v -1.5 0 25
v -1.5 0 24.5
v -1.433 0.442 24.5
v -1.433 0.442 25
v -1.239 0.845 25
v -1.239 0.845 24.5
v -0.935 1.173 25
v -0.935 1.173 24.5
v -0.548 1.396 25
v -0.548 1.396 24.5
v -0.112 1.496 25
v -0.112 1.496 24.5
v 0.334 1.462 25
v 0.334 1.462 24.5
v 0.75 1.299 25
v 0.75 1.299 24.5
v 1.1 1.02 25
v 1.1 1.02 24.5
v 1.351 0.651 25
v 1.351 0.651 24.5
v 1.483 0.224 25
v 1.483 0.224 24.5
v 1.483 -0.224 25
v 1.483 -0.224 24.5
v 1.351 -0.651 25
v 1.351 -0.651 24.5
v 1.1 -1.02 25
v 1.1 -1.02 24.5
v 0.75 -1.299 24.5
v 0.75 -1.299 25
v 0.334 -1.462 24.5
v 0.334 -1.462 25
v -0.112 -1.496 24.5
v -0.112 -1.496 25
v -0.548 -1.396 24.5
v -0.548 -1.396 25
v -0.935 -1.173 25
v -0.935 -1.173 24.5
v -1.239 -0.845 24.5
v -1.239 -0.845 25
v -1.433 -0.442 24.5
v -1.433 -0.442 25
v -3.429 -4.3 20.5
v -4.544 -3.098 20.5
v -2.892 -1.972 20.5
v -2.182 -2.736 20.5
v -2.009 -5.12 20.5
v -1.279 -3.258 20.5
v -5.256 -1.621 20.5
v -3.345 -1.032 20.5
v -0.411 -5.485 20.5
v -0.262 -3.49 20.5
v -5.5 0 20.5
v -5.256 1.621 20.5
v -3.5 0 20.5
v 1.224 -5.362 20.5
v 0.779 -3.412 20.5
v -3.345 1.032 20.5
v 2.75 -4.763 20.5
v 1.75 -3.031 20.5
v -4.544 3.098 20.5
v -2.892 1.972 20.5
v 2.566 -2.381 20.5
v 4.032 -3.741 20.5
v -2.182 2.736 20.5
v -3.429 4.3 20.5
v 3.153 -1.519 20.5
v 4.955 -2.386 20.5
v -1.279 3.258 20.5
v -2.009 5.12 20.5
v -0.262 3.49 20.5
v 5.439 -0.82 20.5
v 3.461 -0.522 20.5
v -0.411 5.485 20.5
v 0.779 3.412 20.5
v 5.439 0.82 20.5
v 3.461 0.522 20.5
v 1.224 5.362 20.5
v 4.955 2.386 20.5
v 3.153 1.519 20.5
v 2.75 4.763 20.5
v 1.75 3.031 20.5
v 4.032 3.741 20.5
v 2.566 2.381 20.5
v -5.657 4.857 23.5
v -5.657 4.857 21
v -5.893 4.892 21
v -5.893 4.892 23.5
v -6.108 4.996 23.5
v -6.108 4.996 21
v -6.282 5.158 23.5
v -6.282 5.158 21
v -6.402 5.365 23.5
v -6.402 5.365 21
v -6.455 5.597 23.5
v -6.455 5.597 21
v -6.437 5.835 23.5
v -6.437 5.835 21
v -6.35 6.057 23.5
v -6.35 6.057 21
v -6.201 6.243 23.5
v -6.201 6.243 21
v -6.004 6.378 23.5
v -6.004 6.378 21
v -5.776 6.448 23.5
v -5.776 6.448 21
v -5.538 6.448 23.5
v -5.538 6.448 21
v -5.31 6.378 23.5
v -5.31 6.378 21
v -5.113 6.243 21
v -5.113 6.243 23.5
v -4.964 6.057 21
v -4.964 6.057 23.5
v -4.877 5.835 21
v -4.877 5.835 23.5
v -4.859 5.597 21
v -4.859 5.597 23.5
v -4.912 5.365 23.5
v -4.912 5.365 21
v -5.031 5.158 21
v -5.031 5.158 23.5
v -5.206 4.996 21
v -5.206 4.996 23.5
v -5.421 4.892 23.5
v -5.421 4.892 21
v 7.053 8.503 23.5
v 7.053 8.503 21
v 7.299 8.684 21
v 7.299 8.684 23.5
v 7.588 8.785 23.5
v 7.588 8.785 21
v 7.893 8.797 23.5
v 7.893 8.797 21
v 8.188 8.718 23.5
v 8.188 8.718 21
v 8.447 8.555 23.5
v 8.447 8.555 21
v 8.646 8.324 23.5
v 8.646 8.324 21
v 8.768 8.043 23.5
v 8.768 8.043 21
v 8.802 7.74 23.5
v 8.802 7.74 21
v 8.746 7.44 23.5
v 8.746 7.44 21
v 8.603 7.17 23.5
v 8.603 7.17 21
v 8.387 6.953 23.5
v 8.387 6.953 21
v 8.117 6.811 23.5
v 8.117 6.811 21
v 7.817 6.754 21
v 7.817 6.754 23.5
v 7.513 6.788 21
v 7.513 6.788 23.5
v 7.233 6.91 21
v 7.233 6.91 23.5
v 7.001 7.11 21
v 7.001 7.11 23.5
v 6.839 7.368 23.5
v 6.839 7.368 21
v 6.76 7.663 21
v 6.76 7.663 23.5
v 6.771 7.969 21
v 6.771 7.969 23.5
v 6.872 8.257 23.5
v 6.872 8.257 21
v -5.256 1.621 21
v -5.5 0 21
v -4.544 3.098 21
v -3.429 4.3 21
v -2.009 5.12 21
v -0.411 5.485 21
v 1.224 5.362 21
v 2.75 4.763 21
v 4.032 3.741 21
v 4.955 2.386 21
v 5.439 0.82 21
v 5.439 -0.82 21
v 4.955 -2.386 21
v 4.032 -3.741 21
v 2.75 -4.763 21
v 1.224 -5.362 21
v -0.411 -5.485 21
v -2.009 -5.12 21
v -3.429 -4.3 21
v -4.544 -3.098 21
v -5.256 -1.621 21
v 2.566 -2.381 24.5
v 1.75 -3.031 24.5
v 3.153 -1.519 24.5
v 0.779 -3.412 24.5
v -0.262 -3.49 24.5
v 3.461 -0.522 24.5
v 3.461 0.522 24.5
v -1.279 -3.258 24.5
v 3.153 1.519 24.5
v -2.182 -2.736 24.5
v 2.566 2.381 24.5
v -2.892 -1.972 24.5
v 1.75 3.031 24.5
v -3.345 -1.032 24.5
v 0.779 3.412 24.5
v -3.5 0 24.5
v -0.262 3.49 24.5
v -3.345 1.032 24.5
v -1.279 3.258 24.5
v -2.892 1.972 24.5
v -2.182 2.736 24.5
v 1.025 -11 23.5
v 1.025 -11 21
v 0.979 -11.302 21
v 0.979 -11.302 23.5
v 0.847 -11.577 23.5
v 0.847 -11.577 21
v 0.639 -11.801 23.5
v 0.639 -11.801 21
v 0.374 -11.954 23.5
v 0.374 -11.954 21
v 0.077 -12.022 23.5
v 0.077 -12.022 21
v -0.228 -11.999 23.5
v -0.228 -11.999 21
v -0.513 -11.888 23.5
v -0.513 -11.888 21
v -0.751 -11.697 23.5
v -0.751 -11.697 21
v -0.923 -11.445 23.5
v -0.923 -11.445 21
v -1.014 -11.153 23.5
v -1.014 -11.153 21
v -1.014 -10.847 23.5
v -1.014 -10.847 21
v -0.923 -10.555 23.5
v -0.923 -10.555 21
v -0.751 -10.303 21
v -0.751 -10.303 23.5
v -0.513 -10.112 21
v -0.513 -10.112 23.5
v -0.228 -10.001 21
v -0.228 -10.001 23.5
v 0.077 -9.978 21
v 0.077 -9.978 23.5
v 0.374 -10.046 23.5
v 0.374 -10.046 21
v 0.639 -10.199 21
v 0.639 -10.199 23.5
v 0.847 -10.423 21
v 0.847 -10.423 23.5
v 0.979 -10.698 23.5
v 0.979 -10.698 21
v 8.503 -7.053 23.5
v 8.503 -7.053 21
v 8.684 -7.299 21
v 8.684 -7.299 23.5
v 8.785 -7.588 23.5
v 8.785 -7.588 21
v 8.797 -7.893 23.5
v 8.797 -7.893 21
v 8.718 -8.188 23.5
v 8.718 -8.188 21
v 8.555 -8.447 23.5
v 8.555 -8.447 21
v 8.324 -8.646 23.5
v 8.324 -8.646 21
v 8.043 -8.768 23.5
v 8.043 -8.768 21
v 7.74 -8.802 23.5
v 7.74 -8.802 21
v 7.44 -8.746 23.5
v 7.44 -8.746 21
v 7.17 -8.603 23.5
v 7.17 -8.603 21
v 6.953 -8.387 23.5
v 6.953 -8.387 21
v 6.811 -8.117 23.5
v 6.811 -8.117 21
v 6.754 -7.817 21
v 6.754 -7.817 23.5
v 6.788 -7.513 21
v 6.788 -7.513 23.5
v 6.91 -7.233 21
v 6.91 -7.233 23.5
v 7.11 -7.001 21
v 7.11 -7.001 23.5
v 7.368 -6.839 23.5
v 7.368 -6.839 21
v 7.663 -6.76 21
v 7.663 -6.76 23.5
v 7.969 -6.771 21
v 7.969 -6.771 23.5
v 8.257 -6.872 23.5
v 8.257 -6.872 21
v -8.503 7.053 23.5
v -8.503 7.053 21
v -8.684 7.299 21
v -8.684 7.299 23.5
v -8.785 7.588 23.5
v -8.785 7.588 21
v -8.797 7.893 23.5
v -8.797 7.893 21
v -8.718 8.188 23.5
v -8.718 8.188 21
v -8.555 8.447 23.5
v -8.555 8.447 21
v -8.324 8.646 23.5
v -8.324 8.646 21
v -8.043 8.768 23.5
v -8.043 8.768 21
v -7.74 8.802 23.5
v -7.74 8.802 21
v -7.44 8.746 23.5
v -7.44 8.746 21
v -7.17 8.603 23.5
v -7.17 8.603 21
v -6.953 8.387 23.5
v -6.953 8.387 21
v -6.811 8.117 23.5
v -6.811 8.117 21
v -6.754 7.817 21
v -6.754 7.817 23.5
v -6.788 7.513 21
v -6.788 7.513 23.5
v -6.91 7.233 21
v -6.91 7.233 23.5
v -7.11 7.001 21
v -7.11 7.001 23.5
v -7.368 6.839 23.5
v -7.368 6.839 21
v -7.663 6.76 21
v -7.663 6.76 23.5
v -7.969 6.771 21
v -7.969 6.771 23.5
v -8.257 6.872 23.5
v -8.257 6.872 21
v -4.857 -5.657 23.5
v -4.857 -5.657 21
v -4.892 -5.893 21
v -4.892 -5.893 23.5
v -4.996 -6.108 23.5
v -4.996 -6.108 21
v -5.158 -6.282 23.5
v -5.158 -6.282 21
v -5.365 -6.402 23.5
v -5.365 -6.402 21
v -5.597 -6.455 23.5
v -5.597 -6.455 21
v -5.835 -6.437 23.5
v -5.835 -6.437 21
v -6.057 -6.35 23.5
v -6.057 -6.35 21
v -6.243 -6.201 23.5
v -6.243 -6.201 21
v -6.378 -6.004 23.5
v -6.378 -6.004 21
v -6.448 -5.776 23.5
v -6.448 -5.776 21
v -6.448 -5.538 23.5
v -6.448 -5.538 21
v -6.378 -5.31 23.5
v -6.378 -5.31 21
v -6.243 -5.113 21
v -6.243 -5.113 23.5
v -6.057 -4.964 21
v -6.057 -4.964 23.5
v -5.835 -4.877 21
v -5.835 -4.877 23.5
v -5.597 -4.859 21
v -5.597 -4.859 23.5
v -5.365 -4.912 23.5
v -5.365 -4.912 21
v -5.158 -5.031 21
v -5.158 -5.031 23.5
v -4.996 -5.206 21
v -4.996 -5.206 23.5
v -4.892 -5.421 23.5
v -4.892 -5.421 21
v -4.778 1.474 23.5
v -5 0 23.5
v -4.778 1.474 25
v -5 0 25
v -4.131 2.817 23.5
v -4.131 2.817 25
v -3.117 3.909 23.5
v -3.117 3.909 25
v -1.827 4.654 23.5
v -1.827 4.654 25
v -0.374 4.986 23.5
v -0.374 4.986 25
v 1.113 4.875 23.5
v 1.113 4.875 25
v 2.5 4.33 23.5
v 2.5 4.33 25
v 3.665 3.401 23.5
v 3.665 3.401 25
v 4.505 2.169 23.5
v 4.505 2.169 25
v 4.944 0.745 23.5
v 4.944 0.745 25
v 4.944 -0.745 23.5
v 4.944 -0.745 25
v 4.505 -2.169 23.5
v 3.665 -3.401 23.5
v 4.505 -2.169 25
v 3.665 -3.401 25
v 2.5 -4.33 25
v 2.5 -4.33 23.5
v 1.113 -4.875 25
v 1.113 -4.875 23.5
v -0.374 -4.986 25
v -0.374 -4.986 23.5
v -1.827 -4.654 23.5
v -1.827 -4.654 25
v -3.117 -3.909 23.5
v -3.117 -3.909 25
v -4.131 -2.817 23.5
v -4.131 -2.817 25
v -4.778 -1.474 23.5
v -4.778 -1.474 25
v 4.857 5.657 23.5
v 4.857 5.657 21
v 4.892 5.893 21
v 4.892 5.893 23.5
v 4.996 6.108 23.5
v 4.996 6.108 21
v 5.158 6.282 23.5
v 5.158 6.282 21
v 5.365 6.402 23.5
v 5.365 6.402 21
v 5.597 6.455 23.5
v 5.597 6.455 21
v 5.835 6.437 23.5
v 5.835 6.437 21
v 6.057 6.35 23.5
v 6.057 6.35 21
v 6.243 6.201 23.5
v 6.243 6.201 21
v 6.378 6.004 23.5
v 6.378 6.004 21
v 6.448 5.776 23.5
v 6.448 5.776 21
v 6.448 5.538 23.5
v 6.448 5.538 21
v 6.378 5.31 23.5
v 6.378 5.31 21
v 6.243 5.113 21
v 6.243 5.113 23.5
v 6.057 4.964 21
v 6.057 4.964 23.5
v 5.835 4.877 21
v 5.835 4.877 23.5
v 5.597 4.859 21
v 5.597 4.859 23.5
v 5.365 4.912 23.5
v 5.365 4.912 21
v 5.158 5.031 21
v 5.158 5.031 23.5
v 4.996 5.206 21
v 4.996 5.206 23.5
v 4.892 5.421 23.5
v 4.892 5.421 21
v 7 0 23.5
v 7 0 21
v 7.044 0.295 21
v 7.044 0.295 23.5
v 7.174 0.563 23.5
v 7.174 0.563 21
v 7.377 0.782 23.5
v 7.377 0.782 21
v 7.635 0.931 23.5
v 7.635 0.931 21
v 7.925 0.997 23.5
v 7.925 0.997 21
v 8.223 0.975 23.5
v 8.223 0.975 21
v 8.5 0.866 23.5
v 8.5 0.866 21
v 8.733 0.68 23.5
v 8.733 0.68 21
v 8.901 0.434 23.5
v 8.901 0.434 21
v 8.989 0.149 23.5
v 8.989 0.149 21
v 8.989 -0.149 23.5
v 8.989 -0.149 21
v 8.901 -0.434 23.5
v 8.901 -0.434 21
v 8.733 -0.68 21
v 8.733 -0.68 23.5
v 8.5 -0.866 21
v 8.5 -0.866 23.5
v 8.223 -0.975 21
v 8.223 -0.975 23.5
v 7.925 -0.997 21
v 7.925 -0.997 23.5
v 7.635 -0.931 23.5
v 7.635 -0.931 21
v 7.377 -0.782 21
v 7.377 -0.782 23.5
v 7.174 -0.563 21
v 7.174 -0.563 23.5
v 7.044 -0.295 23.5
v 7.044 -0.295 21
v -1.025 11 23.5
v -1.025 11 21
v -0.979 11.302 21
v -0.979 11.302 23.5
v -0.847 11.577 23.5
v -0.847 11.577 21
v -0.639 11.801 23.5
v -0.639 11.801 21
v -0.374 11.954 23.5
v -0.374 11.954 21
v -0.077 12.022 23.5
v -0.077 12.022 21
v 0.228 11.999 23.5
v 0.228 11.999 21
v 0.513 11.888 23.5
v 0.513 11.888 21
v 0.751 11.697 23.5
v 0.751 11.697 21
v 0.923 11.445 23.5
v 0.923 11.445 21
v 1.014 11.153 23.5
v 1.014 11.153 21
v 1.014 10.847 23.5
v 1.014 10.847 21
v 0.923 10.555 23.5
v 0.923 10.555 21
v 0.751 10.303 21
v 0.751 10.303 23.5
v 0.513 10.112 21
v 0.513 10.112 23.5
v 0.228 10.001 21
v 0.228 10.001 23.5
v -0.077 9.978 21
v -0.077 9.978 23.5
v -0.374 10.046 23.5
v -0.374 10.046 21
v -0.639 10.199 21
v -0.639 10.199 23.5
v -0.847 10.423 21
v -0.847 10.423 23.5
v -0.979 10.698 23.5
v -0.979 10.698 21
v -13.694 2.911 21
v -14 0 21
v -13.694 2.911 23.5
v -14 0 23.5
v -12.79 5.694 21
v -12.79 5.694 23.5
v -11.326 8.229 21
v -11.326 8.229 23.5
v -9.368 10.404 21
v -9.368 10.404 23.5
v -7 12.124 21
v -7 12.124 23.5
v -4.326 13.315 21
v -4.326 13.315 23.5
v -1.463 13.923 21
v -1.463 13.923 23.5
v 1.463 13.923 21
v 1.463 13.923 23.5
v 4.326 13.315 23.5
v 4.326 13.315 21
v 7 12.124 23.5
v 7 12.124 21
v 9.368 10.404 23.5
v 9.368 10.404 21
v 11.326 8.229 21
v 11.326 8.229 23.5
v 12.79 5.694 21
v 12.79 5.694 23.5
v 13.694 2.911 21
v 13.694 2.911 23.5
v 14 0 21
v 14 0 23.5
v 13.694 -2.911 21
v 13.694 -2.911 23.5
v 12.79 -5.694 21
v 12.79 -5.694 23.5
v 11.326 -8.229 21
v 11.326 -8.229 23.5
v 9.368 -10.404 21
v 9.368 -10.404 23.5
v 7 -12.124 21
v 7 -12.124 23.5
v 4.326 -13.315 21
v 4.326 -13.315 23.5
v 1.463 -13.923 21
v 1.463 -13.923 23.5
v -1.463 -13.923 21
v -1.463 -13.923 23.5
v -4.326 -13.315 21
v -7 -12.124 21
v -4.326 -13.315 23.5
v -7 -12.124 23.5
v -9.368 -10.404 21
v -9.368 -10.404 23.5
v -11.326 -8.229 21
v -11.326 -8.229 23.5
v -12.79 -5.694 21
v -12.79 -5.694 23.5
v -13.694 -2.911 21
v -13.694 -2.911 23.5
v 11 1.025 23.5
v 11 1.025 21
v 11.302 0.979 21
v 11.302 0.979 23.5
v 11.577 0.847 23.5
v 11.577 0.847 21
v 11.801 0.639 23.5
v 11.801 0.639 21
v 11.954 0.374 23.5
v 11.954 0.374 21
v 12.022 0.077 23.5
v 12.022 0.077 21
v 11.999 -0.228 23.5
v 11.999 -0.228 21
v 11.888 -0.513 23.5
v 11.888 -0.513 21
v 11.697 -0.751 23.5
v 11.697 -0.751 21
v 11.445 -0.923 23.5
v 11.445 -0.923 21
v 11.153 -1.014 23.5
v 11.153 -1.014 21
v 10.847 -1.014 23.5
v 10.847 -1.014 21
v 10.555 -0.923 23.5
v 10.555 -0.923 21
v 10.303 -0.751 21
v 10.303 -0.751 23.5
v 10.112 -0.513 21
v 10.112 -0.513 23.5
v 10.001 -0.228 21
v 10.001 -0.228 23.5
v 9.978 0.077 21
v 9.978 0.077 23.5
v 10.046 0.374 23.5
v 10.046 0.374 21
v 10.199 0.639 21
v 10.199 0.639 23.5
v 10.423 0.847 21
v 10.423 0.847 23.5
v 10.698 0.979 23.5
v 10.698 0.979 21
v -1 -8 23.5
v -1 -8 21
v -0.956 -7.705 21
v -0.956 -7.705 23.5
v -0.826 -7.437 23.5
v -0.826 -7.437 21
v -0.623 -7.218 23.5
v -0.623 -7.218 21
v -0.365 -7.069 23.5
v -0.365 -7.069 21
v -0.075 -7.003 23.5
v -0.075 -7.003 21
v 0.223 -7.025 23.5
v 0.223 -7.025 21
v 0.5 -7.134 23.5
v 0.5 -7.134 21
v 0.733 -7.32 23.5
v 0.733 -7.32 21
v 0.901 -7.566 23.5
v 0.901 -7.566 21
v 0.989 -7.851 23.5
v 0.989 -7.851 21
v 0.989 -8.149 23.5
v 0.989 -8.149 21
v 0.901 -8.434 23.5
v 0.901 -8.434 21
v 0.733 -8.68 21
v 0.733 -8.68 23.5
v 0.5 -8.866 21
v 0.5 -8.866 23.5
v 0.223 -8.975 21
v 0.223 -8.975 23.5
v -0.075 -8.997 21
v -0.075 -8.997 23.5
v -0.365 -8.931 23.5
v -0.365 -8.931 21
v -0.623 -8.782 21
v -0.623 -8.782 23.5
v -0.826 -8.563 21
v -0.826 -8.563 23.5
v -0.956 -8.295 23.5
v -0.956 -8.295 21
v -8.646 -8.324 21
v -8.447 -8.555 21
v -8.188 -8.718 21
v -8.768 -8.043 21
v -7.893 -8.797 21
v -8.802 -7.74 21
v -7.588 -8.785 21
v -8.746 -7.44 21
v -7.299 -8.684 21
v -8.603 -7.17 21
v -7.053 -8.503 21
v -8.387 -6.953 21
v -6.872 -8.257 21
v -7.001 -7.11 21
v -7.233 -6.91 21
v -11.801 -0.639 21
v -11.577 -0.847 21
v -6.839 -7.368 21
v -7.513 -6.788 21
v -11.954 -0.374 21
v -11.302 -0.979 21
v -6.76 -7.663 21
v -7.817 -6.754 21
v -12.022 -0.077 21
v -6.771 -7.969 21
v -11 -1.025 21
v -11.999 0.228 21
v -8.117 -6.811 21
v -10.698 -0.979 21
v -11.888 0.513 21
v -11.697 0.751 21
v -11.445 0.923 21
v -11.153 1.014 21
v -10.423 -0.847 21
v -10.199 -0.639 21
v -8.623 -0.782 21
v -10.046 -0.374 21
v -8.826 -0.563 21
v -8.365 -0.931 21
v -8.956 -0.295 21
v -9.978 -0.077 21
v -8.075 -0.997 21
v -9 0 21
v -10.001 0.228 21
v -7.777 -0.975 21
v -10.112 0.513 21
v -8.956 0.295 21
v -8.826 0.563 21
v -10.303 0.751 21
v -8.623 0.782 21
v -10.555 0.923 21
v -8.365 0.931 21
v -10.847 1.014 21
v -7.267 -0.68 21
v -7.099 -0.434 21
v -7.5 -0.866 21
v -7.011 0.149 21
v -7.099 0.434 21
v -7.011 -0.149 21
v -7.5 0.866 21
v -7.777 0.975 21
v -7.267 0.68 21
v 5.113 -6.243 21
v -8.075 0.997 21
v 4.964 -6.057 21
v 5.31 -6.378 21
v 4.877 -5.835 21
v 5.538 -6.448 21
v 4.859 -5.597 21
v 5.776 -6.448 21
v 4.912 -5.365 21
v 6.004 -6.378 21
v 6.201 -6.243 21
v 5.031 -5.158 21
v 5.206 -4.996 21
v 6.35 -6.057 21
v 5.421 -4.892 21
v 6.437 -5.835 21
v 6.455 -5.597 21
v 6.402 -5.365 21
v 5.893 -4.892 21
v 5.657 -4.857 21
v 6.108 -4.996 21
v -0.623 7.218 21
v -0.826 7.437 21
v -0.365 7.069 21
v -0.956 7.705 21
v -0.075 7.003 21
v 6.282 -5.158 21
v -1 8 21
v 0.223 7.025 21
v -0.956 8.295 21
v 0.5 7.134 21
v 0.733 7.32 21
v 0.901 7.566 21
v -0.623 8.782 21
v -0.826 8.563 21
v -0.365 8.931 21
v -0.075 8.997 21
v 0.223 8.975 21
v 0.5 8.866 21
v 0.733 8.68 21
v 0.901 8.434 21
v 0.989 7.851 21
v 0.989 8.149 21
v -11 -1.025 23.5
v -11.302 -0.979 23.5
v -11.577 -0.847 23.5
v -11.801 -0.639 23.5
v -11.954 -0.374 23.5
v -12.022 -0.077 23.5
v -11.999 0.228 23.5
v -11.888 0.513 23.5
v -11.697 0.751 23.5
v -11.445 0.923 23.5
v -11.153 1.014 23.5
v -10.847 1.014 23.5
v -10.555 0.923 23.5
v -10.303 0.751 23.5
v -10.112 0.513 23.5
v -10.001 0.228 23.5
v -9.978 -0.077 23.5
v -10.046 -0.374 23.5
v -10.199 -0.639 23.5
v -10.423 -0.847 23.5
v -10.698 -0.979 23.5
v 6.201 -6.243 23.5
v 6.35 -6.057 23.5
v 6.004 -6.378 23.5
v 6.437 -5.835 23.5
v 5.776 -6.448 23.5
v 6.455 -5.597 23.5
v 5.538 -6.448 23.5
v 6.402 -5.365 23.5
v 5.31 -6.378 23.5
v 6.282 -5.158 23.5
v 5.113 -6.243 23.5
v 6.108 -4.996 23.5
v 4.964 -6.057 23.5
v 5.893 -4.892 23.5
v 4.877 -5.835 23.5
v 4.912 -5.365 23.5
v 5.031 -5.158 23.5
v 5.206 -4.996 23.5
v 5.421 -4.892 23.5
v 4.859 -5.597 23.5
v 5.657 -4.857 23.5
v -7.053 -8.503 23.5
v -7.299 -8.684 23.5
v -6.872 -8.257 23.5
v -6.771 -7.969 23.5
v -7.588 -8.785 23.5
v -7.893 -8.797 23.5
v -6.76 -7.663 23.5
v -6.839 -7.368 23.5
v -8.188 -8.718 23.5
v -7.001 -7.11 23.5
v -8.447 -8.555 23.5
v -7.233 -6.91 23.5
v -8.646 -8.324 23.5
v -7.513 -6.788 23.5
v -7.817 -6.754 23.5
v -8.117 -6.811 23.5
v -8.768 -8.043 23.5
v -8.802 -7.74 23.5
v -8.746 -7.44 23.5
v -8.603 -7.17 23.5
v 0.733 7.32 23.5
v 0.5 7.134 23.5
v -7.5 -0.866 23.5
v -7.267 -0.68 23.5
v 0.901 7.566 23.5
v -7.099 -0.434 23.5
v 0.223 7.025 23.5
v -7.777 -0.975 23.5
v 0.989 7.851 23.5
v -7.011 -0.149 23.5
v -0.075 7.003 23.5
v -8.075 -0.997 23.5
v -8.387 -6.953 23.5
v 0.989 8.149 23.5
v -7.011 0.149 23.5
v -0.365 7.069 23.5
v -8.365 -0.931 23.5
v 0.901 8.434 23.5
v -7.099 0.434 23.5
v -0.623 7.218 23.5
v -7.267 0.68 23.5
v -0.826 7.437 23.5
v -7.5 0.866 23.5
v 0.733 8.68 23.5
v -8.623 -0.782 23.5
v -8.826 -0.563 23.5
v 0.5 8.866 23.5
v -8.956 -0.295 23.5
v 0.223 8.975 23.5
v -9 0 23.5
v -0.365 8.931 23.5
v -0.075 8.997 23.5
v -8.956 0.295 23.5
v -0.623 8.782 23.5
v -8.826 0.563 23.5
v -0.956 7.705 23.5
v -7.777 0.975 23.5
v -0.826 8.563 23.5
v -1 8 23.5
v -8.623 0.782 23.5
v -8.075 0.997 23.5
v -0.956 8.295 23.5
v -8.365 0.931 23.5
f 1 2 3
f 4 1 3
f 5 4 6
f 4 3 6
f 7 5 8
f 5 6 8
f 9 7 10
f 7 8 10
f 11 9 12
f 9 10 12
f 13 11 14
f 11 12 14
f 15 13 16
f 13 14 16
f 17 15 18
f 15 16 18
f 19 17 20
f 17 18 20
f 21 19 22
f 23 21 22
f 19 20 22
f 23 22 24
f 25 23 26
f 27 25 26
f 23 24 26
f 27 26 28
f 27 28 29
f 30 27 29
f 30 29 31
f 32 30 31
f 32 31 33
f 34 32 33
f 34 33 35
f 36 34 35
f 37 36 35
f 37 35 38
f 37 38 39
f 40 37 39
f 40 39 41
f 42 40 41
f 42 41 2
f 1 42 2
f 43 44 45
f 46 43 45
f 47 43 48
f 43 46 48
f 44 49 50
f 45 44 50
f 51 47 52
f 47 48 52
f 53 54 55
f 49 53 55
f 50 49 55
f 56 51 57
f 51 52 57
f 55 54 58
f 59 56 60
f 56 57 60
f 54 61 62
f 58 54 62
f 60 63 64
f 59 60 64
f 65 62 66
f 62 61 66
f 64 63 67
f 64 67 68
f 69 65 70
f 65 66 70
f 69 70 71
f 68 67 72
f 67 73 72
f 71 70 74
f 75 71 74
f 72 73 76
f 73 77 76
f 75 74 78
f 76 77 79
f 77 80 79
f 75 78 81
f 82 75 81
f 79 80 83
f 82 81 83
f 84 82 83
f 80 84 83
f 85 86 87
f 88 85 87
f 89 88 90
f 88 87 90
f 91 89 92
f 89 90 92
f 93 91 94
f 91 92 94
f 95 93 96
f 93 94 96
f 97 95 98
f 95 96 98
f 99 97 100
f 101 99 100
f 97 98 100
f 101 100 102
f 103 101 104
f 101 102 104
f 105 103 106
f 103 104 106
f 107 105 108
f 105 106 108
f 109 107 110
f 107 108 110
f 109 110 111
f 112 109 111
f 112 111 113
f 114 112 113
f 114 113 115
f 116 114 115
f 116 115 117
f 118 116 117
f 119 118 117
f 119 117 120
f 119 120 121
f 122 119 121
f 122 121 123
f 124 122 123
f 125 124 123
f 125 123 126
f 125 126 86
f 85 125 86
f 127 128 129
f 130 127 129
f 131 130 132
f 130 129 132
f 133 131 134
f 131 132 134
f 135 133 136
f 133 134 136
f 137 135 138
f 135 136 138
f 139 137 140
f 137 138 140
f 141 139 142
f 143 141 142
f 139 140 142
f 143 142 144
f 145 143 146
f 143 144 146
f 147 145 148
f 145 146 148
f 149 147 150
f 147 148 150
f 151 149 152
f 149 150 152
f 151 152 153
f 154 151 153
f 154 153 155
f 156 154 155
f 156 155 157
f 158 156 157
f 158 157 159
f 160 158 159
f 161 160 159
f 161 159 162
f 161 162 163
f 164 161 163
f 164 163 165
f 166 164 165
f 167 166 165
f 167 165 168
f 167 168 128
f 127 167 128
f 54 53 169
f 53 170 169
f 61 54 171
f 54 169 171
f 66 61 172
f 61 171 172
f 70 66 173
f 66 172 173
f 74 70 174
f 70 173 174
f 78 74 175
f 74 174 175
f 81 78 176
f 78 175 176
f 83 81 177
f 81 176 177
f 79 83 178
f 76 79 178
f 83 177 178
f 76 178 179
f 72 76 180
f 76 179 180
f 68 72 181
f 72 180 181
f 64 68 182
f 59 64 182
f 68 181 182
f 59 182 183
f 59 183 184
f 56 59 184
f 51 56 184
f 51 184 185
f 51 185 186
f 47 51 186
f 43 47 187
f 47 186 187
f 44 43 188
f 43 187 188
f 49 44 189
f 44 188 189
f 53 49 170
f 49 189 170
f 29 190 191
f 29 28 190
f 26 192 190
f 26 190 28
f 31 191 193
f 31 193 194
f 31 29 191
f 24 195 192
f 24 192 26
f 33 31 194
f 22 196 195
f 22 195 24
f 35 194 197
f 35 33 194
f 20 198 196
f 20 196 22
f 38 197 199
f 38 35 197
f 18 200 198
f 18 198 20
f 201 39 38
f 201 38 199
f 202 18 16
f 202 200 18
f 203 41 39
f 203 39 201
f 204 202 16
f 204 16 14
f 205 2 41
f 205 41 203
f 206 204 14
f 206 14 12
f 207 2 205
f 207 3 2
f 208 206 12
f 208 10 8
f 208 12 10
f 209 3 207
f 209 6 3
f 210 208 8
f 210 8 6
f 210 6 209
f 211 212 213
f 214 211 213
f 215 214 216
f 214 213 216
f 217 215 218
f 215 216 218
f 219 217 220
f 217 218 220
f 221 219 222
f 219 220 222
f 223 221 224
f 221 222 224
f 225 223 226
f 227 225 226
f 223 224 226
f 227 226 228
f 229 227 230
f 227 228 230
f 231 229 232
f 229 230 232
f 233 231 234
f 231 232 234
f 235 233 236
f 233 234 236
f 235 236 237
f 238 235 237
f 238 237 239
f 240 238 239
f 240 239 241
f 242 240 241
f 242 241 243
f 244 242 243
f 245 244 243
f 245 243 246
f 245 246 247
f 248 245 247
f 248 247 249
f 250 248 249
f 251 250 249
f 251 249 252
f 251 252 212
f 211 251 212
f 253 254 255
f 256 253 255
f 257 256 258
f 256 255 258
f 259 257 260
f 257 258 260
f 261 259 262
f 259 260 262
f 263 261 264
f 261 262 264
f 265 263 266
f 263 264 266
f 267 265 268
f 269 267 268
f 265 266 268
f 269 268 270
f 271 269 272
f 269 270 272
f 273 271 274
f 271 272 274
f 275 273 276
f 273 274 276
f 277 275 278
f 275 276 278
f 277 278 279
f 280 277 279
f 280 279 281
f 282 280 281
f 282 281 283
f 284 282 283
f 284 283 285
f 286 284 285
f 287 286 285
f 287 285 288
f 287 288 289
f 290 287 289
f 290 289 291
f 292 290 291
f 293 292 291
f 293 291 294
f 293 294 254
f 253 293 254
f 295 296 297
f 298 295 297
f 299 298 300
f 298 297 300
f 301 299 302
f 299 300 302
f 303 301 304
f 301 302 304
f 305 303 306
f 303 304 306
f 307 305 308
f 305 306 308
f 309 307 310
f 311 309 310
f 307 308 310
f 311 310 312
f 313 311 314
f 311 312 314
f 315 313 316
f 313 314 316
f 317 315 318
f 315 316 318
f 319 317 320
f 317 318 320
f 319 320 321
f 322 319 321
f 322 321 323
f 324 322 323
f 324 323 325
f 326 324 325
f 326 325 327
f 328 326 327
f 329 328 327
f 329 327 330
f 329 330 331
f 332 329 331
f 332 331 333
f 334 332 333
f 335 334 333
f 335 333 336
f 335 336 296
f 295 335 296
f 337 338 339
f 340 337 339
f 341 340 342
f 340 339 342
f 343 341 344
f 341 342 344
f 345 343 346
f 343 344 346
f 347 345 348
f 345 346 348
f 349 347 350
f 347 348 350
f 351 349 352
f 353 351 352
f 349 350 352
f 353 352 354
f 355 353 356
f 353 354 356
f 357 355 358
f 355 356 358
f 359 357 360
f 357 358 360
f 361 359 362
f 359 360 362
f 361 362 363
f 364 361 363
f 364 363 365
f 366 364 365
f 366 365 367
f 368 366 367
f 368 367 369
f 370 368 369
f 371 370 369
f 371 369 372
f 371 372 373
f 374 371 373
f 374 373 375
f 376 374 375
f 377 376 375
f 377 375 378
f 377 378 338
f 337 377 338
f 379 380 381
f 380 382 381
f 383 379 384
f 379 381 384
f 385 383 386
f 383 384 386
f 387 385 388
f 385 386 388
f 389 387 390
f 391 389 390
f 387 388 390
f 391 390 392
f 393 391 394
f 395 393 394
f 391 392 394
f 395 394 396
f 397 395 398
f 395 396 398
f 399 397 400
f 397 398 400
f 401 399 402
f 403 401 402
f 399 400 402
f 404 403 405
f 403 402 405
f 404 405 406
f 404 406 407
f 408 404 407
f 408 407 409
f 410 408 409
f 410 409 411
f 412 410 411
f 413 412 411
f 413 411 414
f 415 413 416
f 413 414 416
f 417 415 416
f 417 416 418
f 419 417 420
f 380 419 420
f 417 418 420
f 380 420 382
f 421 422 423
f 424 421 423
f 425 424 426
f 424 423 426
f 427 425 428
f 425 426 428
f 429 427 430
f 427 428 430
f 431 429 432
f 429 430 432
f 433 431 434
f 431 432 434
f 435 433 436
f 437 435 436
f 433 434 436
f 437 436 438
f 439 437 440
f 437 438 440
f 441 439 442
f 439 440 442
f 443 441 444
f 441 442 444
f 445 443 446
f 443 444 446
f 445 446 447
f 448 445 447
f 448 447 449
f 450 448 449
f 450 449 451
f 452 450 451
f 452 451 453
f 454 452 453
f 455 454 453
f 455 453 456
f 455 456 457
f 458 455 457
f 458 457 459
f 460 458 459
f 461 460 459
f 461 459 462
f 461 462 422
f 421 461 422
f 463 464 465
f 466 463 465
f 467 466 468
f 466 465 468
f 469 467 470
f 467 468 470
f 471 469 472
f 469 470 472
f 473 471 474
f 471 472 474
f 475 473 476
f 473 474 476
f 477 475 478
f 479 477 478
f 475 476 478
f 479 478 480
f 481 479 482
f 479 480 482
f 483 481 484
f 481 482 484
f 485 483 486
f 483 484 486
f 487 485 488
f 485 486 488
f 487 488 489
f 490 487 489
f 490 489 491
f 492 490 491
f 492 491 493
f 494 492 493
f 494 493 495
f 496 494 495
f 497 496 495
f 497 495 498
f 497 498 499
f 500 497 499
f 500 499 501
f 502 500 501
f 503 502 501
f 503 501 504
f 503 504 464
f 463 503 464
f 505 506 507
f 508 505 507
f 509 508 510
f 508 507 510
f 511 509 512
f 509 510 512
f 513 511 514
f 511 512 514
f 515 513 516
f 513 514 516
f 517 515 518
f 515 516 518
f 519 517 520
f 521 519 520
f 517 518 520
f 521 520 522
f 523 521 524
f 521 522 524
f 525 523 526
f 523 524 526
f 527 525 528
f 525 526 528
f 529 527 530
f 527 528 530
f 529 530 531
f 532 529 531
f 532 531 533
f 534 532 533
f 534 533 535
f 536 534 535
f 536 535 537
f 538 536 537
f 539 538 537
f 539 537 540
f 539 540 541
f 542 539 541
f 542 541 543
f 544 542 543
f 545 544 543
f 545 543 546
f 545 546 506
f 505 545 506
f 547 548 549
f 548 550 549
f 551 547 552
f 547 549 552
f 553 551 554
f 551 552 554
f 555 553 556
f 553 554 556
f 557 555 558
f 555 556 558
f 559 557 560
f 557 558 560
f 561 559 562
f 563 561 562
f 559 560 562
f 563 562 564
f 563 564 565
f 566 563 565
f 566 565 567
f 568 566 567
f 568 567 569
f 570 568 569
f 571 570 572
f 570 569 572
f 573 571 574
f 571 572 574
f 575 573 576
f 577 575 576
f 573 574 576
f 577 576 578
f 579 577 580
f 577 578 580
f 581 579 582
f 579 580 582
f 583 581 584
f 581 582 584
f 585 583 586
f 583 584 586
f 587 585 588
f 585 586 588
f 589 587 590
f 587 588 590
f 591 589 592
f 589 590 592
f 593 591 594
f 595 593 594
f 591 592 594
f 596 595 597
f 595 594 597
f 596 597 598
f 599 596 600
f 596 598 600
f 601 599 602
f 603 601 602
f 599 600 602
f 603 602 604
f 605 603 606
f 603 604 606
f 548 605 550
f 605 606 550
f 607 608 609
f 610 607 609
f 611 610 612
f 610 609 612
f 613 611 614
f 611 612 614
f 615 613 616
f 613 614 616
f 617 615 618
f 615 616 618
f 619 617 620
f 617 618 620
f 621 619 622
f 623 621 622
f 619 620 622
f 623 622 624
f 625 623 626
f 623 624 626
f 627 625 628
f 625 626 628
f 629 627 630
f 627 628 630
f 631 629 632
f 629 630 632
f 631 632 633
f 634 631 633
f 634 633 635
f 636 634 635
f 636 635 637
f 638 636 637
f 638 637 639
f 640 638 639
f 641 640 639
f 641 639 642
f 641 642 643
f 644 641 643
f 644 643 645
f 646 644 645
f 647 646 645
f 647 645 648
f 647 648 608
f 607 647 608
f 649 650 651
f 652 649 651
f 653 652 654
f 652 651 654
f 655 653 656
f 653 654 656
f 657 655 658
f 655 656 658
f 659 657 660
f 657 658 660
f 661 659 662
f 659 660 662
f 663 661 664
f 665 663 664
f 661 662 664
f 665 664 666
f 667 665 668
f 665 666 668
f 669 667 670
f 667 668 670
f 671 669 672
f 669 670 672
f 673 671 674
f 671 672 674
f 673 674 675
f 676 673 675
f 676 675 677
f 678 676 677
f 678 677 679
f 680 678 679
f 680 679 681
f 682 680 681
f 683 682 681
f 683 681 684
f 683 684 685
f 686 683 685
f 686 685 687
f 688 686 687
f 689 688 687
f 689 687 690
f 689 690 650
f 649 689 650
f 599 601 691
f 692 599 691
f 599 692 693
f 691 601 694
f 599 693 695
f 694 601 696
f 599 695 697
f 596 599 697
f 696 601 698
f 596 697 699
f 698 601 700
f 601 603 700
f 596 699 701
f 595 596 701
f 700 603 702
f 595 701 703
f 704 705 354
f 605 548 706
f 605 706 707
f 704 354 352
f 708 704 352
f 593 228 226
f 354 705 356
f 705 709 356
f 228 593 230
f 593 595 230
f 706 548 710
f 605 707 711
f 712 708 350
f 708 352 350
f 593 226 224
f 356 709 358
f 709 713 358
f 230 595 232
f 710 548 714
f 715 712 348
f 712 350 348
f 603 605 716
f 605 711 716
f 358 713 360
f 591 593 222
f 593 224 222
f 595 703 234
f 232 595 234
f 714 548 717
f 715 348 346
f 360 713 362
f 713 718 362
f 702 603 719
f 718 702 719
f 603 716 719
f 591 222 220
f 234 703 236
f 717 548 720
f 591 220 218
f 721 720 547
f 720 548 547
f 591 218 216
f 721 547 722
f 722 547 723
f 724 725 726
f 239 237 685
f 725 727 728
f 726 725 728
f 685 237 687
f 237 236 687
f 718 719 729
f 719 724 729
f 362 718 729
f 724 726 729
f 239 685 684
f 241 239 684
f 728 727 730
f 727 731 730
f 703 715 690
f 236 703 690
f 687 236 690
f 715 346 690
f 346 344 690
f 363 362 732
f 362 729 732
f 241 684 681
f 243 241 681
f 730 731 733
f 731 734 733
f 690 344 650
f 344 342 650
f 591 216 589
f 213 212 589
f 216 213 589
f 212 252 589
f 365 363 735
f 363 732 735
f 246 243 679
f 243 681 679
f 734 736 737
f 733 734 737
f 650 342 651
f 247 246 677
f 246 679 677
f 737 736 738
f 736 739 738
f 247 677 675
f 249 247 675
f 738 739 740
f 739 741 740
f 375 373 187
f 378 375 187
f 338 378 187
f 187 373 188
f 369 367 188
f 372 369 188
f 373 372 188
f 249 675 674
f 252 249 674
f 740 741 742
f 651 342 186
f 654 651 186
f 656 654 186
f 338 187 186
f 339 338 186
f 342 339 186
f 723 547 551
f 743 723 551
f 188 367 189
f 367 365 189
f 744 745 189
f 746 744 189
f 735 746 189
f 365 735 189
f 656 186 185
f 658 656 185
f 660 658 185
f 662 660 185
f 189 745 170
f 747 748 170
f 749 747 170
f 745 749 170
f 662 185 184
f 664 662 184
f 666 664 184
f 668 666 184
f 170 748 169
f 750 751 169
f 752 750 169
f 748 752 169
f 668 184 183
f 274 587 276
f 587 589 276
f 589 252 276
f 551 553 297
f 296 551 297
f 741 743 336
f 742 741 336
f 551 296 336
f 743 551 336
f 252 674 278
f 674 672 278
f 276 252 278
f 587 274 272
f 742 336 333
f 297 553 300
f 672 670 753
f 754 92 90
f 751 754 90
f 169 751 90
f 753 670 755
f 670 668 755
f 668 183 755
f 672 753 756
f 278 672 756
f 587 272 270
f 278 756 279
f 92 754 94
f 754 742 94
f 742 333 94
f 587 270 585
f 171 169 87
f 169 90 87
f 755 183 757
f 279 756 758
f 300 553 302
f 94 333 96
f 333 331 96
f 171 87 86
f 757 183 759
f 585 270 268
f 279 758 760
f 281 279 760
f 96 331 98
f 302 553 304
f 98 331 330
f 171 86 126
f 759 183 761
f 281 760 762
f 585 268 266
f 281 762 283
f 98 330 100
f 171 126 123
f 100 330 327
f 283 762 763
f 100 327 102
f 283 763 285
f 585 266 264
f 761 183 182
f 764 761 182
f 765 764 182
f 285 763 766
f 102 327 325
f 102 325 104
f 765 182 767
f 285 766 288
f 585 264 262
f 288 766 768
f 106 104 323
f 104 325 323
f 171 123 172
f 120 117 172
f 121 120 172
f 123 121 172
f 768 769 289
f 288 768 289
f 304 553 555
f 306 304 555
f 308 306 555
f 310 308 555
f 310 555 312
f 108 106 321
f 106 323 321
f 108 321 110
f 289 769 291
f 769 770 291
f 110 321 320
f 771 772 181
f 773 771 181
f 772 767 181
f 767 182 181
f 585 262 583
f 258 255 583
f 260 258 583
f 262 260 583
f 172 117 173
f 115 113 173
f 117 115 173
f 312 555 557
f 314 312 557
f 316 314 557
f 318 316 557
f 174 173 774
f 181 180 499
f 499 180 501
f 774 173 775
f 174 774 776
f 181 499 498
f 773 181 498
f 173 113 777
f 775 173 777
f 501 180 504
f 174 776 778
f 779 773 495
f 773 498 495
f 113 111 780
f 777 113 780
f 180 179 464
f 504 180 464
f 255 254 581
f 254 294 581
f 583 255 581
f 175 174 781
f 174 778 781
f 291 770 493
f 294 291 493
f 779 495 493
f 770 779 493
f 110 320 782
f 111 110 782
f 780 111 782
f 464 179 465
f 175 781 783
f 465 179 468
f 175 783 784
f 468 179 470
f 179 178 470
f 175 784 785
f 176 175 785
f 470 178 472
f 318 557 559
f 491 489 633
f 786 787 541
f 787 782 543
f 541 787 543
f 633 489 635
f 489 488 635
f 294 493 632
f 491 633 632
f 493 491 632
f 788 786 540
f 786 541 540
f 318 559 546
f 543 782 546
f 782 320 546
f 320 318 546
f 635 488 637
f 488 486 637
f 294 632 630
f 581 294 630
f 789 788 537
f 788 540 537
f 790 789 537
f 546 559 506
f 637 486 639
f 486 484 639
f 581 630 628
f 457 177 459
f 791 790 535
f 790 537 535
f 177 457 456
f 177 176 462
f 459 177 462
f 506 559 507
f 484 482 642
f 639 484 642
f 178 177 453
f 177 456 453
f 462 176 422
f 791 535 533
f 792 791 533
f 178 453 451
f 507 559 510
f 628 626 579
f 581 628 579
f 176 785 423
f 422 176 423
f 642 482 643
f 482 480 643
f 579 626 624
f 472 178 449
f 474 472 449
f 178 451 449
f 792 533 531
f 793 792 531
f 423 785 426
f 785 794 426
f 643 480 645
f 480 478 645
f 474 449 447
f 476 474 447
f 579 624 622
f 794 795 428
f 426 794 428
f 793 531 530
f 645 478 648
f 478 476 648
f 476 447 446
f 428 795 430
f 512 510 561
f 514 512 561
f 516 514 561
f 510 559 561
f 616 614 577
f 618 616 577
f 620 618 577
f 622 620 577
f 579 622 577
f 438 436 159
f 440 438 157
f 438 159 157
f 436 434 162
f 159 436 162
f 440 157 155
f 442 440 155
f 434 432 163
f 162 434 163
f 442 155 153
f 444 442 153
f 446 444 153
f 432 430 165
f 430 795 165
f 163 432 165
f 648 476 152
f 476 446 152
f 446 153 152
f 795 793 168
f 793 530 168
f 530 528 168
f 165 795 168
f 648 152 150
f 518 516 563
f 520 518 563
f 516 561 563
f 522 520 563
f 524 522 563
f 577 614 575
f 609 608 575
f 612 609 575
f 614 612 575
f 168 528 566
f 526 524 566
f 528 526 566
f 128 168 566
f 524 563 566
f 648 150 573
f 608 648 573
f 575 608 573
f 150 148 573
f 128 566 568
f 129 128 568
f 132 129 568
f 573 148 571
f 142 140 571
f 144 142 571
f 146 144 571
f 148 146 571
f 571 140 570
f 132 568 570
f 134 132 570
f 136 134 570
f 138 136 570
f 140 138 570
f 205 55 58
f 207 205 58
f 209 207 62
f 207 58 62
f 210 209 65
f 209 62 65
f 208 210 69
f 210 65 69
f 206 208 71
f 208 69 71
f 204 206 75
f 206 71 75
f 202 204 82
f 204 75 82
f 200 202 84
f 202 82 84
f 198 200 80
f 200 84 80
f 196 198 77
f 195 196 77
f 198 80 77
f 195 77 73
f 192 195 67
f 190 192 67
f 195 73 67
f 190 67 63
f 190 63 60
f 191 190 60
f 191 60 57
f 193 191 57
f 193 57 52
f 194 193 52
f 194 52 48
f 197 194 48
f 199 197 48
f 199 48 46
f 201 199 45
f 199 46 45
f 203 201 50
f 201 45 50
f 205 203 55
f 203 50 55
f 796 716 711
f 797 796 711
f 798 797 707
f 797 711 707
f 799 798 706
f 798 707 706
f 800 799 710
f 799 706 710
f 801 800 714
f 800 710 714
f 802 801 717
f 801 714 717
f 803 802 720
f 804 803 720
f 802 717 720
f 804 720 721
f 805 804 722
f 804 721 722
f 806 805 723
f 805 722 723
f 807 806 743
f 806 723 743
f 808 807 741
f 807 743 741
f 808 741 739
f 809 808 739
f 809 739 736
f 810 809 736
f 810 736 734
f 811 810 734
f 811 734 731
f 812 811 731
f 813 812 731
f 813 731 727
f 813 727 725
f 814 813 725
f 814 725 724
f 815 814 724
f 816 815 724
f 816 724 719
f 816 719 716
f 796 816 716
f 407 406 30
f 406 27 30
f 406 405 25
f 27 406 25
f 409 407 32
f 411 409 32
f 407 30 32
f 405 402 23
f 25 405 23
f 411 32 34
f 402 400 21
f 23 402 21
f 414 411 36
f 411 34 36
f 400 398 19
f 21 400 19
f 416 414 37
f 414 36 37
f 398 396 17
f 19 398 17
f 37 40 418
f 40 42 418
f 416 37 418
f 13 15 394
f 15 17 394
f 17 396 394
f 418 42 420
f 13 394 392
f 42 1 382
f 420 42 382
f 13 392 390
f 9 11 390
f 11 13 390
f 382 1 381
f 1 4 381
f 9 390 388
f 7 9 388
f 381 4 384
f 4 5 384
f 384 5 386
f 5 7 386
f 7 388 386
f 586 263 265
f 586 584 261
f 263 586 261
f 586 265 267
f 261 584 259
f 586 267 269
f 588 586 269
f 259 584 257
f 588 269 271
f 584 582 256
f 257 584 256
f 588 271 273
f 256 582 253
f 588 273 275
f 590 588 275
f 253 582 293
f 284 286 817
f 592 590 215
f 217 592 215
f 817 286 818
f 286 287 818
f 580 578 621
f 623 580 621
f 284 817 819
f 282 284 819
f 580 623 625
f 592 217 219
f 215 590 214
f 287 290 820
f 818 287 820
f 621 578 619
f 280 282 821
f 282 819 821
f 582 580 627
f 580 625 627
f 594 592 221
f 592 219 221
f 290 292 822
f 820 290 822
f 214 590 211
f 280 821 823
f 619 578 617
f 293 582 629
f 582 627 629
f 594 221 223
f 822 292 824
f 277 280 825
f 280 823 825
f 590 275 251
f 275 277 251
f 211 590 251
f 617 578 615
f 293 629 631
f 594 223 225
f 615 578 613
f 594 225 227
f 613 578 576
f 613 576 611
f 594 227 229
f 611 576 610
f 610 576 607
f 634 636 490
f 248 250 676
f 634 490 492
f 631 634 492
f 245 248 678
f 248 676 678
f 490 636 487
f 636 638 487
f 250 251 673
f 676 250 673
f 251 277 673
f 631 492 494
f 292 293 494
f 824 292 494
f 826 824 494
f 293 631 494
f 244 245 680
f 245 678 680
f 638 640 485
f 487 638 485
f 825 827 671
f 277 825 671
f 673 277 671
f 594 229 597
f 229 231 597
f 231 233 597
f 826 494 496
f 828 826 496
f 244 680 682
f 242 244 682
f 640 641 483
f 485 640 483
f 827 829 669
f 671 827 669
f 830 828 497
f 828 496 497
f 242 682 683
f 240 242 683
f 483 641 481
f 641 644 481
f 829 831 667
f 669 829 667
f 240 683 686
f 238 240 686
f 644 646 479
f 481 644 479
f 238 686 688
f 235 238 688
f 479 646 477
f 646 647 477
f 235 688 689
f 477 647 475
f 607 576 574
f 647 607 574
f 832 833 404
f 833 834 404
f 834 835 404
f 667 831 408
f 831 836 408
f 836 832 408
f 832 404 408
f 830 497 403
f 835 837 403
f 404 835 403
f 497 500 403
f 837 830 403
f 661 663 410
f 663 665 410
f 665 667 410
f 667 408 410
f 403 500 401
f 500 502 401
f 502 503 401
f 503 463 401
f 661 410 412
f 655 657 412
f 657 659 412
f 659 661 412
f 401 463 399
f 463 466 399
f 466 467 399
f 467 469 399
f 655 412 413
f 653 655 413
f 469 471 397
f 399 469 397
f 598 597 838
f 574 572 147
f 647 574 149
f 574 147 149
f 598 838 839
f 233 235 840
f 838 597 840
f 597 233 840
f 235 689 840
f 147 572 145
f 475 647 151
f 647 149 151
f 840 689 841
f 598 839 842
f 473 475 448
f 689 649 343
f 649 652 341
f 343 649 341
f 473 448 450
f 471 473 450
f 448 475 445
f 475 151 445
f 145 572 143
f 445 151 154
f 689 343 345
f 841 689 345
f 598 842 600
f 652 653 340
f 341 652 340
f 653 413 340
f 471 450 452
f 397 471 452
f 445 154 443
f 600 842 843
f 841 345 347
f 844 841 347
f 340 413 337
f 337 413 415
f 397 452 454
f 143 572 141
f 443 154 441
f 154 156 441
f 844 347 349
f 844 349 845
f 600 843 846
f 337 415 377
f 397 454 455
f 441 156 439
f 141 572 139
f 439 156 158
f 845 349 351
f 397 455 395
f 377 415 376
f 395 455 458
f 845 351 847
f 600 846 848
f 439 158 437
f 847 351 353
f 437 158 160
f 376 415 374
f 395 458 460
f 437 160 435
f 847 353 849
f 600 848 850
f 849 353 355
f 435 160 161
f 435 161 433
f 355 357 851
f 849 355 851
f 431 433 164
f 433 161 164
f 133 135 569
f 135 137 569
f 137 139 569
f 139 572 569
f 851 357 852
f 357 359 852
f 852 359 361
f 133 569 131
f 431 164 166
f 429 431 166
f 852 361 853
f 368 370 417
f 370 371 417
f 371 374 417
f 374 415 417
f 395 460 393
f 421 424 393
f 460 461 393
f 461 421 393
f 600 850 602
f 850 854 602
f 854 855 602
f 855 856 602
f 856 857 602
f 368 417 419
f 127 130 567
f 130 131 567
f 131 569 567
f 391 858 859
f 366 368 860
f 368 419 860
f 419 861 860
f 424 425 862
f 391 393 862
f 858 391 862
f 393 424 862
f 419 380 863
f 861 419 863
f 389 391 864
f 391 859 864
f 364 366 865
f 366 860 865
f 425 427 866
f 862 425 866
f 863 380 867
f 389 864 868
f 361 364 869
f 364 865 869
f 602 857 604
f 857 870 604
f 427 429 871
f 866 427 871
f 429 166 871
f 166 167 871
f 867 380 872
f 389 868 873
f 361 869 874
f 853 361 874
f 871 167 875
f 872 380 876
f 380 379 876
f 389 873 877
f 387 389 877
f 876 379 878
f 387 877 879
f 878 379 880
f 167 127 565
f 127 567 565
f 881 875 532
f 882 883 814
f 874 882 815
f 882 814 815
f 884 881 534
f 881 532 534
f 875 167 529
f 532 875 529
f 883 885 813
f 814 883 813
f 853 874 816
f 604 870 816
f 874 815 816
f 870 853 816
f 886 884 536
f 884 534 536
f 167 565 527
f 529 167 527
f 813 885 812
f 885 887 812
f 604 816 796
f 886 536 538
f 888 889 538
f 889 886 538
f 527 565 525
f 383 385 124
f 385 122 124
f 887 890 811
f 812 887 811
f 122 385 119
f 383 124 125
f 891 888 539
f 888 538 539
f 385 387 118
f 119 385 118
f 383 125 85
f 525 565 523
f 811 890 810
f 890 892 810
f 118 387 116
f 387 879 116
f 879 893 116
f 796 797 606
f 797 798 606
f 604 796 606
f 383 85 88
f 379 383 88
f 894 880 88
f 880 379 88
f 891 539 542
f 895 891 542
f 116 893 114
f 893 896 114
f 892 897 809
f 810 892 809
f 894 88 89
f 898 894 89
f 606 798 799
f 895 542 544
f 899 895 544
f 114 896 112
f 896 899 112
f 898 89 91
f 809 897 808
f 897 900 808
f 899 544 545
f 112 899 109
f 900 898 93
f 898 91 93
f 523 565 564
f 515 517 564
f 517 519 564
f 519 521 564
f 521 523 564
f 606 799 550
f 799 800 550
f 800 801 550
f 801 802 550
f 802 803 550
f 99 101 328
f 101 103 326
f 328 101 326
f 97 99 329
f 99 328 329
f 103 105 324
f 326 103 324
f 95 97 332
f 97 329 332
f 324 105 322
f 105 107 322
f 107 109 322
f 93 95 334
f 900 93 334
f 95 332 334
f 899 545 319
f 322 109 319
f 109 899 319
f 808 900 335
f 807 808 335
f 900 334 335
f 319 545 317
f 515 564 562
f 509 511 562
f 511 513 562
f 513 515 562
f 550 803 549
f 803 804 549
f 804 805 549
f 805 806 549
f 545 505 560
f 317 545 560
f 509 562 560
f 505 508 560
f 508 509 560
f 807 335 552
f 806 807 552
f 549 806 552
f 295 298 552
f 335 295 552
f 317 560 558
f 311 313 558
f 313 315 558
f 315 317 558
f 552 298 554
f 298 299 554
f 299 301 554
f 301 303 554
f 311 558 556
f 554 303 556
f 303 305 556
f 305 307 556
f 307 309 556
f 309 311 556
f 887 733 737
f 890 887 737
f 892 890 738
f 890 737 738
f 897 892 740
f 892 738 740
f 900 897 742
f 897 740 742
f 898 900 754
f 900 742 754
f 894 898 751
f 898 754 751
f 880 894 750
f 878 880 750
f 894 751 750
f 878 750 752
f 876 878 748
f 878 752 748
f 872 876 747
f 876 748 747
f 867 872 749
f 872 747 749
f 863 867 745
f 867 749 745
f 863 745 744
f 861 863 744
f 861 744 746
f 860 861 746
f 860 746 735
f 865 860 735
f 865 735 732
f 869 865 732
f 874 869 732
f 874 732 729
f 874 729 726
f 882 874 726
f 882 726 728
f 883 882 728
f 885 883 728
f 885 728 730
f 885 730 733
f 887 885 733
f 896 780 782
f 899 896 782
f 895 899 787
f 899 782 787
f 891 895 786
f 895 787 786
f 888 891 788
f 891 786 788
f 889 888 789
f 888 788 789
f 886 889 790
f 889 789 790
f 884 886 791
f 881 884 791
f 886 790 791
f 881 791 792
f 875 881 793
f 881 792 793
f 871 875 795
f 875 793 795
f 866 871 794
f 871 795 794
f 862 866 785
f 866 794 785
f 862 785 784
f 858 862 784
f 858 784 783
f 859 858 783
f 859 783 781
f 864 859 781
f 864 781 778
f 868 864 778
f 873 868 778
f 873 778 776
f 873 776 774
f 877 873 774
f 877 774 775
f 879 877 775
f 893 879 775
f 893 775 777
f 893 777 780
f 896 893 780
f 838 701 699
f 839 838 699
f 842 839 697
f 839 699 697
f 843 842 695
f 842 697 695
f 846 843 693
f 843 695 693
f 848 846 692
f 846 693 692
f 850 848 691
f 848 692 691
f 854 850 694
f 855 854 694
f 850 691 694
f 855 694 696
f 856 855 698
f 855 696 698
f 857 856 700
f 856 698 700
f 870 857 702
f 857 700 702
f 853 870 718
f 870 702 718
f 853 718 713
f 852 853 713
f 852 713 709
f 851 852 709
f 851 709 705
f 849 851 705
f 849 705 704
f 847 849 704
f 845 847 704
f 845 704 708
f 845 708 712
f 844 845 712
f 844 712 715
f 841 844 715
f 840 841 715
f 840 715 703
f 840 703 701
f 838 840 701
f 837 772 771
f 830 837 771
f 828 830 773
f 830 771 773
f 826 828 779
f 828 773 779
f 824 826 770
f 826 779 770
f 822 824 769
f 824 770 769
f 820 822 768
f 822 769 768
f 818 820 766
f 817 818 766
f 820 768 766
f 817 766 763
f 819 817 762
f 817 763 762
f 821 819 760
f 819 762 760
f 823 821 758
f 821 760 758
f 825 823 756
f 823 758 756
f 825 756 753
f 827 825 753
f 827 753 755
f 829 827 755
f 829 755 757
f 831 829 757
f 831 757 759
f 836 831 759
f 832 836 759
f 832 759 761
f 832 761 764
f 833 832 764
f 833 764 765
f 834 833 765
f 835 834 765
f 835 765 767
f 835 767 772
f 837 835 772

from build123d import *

# Parameters (mm, degrees)
F_3_0_3_DIAMETER_HOLE1_D = 3
M2_5_TAPPED_HOLE1_D      = 2.05
CIRPATTERN1_COUNT        = 8
F_2_0_2_DIAMETER_HOLE1_D = 2
M2_TAPPED_HOLE1_D        = 1.6
CIRPATTERN2_COUNT        = 4
SKETCH14_R               = 3.5
CUT_EXTRUDE1_DEPTH       = 4


with BuildPart() as part:
    # Sketch1 → Revolve1 (revolve)
    with BuildSketch(Plane.XZ, mode=Mode.PRIVATE) as revolve1_sk:
        Polygon((2.75, 25), (0, 25), (0, 24.516404416), (0, 20.5), (5.5, 20.5), (5.5, 21), (14, 21), (14, 23.5), (5, 23.5), (5, 25), align=None)
    revolve(revolve1_sk.sketch.rotate(Axis((0, 0, 24.516404416), (0, 0, -1)), 180), axis=Axis((0, 0, 24.516404416), (0, 0, -1)))

    # Ø3.0 (3) Diameter Hole1 (through all)
    with Locations(Plane.XY.offset(25)):
        with Locations((0, 0)):
            Hole(F_3_0_3_DIAMETER_HOLE1_D / 2)

    # M2.5 Tapped Hole1 (through all)
    with Locations(Plane.XY.offset(23.5)):
        with Locations((0, 11)):
            m2_5_tapped_hole1 = Hole(M2_5_TAPPED_HOLE1_D / 2)

    # CirPattern1: M2.5 Tapped Hole1 ×8 about axis
    cirpattern1_axis = Axis((0, 0, 0), (0, 0, 1))
    for i in range(1, CIRPATTERN1_COUNT):
        add(m2_5_tapped_hole1.rotate(cirpattern1_axis, i * 360 / CIRPATTERN1_COUNT), mode=Mode.SUBTRACT)

    # Ø2.0 (2) Diameter Hole1 (through all)
    with Locations(Plane.XY.offset(25)):
        with Locations((0, 8), (8, 0), (0, -8), (-8, 0)):
            Hole(F_2_0_2_DIAMETER_HOLE1_D / 2)

    # M2 Tapped Hole1 (through all)
    with Locations(Plane.XY.offset(23.5)):
        with Locations((5.656854249, 5.656854249)):
            m2_tapped_hole1 = Hole(M2_TAPPED_HOLE1_D / 2)

    # CirPattern2: M2 Tapped Hole1 ×4 about axis
    cirpattern2_axis = Axis((0, 0, 0), (0, 0, 1))
    for i in range(1, CIRPATTERN2_COUNT):
        add(m2_tapped_hole1.rotate(cirpattern2_axis, i * 360 / CIRPATTERN2_COUNT), mode=Mode.SUBTRACT)

    # Sketch14 → Cut-Extrude1 (cut)
    with BuildSketch(Plane(origin=(0, 0, 20.5), x_dir=(-1, 0, 0), z_dir=(0, 0, -1))):
        Circle(SKETCH14_R)
    extrude(amount=-CUT_EXTRUDE1_DEPTH, mode=Mode.SUBTRACT)


solid = part.part
